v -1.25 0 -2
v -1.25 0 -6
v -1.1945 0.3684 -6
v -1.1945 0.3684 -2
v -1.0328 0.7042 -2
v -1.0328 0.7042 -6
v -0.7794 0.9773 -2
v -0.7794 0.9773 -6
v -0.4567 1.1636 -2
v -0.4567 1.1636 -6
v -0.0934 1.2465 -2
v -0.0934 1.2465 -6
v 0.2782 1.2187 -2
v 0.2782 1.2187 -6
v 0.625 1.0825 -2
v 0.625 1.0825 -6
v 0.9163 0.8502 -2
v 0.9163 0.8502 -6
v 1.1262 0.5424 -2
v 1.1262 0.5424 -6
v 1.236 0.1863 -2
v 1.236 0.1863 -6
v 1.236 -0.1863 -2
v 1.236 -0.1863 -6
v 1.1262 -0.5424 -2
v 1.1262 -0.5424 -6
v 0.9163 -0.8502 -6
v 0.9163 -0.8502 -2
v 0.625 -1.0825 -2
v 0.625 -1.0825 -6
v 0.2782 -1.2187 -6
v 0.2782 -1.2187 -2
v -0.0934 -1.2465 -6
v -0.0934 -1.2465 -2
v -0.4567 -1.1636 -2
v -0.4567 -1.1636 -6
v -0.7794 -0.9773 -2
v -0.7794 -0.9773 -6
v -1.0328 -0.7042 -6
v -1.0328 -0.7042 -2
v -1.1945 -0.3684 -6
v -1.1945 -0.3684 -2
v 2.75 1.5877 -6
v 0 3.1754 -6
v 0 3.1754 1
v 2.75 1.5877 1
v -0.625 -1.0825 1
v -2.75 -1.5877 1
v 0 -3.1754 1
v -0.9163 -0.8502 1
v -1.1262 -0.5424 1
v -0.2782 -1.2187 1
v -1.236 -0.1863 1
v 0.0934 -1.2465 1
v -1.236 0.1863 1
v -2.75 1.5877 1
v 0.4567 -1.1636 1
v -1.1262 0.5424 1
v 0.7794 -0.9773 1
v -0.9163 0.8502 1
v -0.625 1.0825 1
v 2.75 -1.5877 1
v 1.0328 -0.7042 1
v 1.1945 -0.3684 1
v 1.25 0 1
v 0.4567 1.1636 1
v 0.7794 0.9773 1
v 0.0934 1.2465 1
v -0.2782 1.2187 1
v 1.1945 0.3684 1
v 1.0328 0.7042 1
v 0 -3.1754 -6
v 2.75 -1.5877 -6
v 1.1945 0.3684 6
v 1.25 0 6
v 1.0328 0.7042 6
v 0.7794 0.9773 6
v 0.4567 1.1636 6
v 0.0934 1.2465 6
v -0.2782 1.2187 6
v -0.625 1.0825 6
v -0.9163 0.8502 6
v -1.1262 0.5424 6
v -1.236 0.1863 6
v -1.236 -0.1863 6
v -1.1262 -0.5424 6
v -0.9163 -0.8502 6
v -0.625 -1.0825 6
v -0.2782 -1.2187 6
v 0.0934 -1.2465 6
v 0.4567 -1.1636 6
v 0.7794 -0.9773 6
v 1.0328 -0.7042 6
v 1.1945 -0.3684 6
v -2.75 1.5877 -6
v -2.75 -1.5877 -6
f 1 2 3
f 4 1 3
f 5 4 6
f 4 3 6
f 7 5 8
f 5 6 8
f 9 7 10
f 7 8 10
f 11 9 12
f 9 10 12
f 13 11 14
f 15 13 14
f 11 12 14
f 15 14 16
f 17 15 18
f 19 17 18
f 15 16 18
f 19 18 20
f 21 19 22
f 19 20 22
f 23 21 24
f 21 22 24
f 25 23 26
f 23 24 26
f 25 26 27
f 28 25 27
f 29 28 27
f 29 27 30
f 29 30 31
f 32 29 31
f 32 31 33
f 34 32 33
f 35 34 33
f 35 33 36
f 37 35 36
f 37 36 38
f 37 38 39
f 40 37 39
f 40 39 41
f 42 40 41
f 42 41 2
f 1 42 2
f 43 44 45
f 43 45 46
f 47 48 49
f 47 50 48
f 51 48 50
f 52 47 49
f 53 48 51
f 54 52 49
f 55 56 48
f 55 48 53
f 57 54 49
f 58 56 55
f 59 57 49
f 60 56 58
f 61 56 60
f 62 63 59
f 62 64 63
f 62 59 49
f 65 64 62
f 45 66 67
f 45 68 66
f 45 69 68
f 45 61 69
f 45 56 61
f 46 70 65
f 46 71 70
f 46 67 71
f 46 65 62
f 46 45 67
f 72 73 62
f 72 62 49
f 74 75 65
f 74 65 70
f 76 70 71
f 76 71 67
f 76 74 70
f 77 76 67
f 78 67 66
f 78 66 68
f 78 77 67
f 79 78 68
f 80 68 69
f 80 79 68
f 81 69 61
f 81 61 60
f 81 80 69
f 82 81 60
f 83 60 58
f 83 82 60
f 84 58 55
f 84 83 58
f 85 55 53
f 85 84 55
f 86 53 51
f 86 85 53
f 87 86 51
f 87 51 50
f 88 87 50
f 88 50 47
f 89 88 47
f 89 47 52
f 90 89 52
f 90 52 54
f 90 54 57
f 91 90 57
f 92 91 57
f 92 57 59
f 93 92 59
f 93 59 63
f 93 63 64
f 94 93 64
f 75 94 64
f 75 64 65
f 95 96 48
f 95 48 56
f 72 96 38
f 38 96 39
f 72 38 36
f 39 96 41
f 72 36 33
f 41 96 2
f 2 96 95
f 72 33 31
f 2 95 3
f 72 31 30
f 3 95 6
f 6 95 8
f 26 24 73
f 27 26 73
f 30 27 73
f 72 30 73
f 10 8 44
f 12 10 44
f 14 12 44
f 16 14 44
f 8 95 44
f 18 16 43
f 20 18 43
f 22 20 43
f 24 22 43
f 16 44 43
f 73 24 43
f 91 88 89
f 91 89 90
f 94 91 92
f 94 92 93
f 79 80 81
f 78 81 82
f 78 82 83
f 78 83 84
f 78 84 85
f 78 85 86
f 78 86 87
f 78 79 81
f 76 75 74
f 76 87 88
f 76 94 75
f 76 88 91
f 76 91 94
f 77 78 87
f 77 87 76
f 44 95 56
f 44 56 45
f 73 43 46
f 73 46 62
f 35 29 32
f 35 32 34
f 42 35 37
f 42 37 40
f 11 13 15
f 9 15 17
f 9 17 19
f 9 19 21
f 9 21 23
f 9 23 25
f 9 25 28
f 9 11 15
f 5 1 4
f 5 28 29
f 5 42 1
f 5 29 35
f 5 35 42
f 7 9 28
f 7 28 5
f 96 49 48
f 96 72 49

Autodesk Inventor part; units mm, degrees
ref_plane "YZ Plane" through (0, 0, 0) normal (1, 0, 0) x (0, 1, 0)
ref_plane "XZ Plane" through (0, 0, 0) normal (0, 1, 0) x (-1, 0, 0)
ref_plane "XY Plane" through (0, 0, 0) normal (0, 0, 1) x (1, 0, 0)
sketch "Sketch1" plane through (0, 0, 0) normal (0, 0, 1) x (1, 0, 0)
  line L0 (0, 4.4456) -> (0, -4.4456) projected
  line L1 (-3.85, 0) -> (3.85, 0) projected
  circle A0 centre (0, 0) radius 1.25
  line L2 (0, 3.1754) -> (2.75, 1.5877)
  line L3 (2.75, 1.5877) -> (2.75, -1.5877)
  line L4 (2.75, -1.5877) -> (0, -3.1754)
  line L5 (0, -3.1754) -> (-2.75, -1.5877)
  line L6 (-2.75, -1.5877) -> (-2.75, 1.5877)
  line L7 (-2.75, 1.5877) -> (0, 3.1754)
  dimension "d0" = 2.5
  dimension "d1" = 5.5
extrude "Extrusion1" add sketch "Sketch1" along normal mid plane 12
sketch "Sketch2" plane through (0, 0, -6) normal (0, 0, -1) x (-1, 0, 0)
  circle A0 centre (0, 0) radius 1.25
  dimension "d4" = 2.5
extrude "Extrusion2" cut sketch "Sketch2" against normal blind 4
sketch "Sketch3" plane through (2.75, -1.5877, 6) normal (1, 0, 0) x (0, 0, -1)
  line L0 (0, 3.1754) -> (0, 0) projected
  line L1 (12, 0) -> (0, 0) projected
  line L2 (12, 0) -> (12, 3.1754) projected
  line L3 (12, 3.1754) -> (0, 3.1754) projected
  line L4 (6, 0) -> (6, 3.1754)
  point P0 (6, 1.5877)
sketch "Sketch4" plane through (0, 0, 6) normal (0, 0, 1) x (1, 0, 0)
  line L0 (0, 3.1754) -> (2.75, 1.5877) projected
  line L1 (-2.75, 1.5877) -> (0, 3.1754) projected
  line L2 (-2.75, -1.5877) -> (-2.75, 1.5877) projected
  line L3 (0, -3.1754) -> (-2.75, -1.5877) projected
  line L4 (2.75, -1.5877) -> (0, -3.1754) projected
  line L5 (2.75, 1.5877) -> (2.75, -1.5877) projected
  circle A0 centre (0, 0) radius 1.25
  dimension "d7" = 2.5
extrude "Extrusion3" cut sketch "Sketch4" against normal blind 5
thread "Thread1" size "M3x0.5" class "6H" standard "ANSI Metric M Profile" full length
thread "Thread2" size "M3x0.5" class "6g" standard "ANSI Metric M Profile" full length
properties part number "Motherboard Standoff 11mm M3x0.5"
